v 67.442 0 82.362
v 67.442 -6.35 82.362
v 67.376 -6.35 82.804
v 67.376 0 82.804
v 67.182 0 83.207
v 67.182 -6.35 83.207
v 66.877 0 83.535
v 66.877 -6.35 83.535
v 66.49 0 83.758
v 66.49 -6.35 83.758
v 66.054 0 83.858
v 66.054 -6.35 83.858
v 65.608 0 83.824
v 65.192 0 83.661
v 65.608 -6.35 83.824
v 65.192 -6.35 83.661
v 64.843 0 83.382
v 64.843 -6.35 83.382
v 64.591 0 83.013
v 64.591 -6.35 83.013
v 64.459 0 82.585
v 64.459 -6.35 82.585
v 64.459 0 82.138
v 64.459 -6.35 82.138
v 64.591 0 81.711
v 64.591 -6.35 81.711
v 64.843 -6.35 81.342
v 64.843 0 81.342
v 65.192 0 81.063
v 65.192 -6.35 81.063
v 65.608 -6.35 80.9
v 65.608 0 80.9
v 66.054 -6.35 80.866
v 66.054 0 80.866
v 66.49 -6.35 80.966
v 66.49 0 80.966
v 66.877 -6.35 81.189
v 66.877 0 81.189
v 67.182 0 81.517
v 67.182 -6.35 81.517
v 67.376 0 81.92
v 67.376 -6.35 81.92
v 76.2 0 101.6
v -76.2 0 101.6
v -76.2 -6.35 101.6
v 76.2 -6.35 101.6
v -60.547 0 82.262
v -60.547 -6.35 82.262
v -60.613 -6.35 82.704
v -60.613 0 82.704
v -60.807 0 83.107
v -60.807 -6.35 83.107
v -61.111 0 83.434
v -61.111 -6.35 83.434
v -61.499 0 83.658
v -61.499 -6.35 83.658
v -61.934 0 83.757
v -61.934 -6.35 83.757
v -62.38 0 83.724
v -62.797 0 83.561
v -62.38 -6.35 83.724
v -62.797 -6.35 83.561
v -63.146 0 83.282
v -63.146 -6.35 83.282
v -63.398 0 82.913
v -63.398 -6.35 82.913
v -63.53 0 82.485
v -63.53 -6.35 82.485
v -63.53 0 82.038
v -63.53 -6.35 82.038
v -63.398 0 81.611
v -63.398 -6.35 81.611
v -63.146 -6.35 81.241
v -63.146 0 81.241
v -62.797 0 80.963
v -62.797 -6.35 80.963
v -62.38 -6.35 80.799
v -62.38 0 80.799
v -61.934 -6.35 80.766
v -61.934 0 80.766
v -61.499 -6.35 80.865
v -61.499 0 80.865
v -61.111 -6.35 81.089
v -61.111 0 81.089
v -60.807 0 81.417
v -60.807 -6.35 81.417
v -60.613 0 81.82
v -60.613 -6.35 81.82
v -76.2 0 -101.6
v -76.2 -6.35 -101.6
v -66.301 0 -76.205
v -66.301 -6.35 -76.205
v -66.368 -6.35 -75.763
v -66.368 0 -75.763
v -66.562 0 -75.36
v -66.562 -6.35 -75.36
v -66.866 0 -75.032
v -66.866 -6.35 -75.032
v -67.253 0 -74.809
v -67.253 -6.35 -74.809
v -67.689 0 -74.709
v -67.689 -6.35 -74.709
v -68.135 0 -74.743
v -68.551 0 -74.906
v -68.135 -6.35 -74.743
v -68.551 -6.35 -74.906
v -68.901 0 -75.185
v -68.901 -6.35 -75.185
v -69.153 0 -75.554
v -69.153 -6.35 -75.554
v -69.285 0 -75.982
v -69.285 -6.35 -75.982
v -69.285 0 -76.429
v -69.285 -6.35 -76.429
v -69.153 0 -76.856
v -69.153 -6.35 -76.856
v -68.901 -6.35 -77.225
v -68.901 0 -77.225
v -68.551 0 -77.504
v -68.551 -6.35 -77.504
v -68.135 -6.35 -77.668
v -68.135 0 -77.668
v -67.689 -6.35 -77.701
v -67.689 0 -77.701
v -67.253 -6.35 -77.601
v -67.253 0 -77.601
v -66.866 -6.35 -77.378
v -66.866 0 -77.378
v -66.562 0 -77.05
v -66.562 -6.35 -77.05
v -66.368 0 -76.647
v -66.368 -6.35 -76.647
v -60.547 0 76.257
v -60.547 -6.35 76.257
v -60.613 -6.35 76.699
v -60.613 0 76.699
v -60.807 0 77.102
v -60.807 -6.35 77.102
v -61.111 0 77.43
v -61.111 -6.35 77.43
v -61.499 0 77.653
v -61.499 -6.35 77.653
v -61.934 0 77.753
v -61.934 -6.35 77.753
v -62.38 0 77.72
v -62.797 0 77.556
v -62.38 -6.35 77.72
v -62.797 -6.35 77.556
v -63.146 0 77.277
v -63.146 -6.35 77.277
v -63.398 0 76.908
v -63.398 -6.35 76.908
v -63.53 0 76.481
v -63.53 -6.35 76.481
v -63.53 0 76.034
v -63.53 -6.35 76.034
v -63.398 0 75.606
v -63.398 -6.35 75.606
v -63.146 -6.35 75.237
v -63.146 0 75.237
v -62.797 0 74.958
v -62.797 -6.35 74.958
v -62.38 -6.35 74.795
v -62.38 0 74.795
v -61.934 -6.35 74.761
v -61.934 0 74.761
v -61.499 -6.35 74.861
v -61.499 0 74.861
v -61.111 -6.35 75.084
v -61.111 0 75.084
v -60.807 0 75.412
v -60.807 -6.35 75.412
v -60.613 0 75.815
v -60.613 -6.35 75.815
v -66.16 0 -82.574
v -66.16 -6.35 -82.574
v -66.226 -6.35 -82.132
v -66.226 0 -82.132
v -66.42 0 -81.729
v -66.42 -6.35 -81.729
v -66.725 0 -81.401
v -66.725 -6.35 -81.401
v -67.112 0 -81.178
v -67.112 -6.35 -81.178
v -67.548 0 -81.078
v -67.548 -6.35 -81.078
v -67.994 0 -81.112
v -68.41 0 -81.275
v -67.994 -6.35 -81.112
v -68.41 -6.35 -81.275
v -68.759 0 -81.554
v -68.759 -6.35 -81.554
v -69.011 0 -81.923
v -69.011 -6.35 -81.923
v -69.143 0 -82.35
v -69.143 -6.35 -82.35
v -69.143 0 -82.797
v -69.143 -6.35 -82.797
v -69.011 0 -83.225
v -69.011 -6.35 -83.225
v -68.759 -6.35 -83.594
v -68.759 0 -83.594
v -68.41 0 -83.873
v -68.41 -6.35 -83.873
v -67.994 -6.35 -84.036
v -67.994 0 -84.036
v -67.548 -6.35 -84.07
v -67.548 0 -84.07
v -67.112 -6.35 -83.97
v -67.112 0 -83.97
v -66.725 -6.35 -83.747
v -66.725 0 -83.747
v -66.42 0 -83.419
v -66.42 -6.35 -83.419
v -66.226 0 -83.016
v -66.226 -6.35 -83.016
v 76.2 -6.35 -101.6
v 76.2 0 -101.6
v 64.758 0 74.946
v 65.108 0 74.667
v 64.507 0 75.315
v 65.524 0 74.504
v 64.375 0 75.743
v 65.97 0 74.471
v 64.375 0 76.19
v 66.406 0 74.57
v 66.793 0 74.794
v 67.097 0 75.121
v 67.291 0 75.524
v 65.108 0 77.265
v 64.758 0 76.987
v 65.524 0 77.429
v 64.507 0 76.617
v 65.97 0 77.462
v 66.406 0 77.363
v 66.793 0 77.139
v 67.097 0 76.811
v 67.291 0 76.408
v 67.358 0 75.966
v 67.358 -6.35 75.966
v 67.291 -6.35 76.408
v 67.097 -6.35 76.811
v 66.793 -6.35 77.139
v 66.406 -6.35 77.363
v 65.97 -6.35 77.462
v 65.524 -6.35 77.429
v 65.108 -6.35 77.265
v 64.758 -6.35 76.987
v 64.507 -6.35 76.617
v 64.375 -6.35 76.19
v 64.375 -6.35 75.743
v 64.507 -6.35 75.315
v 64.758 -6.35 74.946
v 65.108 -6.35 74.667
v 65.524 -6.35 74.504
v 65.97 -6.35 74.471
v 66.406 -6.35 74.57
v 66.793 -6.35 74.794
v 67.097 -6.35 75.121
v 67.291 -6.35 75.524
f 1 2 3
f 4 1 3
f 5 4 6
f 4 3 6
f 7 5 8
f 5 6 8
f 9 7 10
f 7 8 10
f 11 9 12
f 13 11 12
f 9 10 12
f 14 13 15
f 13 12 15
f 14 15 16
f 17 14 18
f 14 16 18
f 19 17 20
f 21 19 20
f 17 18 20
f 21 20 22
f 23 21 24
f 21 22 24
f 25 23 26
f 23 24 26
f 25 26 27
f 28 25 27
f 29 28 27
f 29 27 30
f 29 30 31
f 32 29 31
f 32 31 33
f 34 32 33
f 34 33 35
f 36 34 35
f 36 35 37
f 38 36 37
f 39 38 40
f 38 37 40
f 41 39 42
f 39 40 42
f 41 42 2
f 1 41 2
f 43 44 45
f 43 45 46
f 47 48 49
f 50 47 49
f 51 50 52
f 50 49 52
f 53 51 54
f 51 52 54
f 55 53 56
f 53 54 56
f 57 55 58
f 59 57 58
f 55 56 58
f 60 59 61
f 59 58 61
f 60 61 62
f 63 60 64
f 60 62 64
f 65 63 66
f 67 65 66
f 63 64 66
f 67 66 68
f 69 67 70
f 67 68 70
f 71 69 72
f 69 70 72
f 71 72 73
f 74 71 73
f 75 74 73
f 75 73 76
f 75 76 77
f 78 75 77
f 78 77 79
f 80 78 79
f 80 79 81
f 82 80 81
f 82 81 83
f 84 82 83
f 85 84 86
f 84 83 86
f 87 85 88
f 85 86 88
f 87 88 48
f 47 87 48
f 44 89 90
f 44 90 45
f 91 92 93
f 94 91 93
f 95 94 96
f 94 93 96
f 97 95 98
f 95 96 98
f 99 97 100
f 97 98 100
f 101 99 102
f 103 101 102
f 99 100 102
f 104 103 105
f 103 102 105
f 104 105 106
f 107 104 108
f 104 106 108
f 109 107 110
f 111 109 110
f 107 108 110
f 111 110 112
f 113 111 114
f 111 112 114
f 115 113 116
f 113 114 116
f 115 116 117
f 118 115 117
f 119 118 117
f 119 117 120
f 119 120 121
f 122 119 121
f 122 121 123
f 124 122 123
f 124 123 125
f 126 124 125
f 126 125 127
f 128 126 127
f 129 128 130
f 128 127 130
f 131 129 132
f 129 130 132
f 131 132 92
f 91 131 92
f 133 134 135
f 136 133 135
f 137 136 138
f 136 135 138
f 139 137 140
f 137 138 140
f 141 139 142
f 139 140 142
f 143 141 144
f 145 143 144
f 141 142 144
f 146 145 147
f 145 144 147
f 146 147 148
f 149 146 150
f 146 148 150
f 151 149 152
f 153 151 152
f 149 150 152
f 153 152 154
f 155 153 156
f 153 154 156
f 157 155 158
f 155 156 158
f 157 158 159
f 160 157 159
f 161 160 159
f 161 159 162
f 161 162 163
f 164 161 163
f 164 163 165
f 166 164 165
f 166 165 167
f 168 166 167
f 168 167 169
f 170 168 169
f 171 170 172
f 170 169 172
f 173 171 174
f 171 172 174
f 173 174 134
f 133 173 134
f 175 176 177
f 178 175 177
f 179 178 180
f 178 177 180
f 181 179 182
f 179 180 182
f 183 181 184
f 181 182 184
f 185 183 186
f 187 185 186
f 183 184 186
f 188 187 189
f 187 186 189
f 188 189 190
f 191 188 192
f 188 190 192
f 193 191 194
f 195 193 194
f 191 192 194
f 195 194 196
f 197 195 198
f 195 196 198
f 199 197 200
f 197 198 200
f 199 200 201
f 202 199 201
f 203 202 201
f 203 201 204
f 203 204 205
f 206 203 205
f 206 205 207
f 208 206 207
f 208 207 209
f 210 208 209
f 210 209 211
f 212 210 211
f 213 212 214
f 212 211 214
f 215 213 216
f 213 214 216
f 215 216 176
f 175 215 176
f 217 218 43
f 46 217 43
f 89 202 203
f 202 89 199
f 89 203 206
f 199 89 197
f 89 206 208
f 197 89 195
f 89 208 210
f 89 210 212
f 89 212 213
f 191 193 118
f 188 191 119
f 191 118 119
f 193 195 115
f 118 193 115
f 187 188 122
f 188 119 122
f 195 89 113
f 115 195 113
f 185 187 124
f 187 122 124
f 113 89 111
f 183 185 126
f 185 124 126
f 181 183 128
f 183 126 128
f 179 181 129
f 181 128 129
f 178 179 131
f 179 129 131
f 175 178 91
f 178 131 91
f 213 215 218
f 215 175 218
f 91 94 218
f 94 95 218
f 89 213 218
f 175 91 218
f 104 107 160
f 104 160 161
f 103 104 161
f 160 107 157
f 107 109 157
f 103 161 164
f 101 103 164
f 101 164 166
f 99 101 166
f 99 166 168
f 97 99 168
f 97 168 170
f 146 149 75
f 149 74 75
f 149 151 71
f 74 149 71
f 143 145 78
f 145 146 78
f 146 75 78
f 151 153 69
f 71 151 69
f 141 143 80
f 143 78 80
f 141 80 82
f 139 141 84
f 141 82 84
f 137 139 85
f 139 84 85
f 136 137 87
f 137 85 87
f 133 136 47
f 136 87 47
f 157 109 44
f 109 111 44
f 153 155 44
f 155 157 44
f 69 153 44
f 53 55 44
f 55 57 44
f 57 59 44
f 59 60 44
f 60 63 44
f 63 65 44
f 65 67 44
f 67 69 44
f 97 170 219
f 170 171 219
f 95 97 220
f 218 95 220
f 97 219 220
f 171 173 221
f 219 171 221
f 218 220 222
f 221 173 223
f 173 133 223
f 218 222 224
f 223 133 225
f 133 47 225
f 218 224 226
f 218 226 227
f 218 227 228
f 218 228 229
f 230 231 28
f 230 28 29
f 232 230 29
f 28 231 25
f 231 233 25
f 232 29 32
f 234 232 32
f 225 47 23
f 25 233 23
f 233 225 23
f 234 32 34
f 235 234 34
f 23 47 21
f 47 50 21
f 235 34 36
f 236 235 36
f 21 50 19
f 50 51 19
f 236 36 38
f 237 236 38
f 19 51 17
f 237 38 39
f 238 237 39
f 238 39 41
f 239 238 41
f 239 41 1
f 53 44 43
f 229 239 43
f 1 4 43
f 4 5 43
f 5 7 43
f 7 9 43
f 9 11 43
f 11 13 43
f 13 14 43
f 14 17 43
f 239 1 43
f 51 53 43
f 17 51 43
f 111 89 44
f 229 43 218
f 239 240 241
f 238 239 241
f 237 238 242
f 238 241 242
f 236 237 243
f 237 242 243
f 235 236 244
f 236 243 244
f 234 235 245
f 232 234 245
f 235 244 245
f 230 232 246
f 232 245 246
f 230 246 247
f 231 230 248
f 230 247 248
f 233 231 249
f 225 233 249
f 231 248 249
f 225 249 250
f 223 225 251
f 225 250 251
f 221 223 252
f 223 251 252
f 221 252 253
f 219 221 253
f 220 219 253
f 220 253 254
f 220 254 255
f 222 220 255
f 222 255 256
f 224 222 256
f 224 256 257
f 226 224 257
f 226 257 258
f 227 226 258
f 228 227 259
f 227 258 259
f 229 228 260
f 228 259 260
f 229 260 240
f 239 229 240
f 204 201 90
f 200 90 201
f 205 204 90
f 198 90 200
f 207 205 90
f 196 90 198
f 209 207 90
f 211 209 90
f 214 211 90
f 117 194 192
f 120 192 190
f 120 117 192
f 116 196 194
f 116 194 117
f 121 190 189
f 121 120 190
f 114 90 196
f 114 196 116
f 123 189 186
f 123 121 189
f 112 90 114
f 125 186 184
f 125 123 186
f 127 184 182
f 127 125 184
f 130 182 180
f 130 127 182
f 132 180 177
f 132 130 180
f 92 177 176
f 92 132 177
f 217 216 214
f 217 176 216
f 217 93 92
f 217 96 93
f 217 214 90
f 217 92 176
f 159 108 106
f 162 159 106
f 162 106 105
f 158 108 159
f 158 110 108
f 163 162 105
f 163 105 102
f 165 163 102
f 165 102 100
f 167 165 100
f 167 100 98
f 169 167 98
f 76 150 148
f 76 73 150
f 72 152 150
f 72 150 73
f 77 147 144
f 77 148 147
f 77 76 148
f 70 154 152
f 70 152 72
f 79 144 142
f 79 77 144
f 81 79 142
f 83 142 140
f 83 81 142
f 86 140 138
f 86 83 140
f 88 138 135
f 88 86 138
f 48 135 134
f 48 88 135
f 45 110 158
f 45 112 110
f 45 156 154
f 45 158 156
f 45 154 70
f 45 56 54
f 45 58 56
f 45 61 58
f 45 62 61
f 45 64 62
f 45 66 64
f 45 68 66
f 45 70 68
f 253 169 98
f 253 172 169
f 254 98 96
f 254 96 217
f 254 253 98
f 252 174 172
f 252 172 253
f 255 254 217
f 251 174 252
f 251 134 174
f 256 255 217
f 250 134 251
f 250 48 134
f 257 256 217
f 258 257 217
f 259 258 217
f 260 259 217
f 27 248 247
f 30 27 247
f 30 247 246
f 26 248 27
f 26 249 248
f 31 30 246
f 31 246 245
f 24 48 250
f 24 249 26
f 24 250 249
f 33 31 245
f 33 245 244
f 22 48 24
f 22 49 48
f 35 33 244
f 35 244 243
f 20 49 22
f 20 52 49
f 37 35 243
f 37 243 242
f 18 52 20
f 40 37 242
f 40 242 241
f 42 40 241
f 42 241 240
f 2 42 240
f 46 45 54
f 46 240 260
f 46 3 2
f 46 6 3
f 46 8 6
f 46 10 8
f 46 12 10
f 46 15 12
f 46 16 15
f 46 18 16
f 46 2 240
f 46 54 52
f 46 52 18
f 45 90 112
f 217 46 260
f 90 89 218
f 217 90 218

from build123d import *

# Parameters (mm, degrees)
F0_W      = 152.4
F0_H      = 203.2
F1_DEPTH  = 6.35
F3_R      = 1.5
F5_DEPTH  = 6.35
F4_R      = 1.5
F6_DEPTH  = 6.35
F7_R      = 1.5
F8_DEPTH  = 6.35
F10_R     = 1.5
F9_R      = 1.5
F11_DEPTH = 6.35


with BuildPart() as f1:
    # F0 (on Front) → F1 (new body)
    with BuildSketch(Plane.XZ):
        Rectangle(F0_W, F0_H)
    extrude(amount=F1_DEPTH)

    # F3 (on face) → F5 (cut)
    with BuildSketch(Plane.XZ.offset(6.35)):
        with Locations((-62.046528, 82.261689)):
            Circle(F3_R)
    extrude(amount=-F5_DEPTH, mode=Mode.SUBTRACT)

    # F4 (on face) → F6 (cut)
    with BuildSketch(Plane.XZ.offset(6.35)):
        with Locations((-62.046528, 76.257184)):
            Circle(F4_R)
    extrude(amount=-F6_DEPTH, mode=Mode.SUBTRACT)

    # F7 (on face) → F8 (cut)
    with BuildSketch(Plane.XZ.offset(6.35)):
        with Locations((65.942168, 82.361914)):
            Circle(F7_R)
        with Locations((65.858014, 75.966306)):
            Circle(F7_R)
    extrude(amount=-F8_DEPTH, mode=Mode.SUBTRACT)

    # F10 (on face) + F9 (on face) → F11 (cut)
    with BuildSketch(Plane.XZ.offset(6.35)):
        with Locations((-67.659773, -82.573913)):
            Circle(F10_R)
    with BuildSketch(Plane.XZ.offset(6.35)):
        with Locations((-67.801304, -76.205179)):
            Circle(F9_R)
    extrude(amount=-F11_DEPTH, mode=Mode.SUBTRACT)


solid = f1.part
